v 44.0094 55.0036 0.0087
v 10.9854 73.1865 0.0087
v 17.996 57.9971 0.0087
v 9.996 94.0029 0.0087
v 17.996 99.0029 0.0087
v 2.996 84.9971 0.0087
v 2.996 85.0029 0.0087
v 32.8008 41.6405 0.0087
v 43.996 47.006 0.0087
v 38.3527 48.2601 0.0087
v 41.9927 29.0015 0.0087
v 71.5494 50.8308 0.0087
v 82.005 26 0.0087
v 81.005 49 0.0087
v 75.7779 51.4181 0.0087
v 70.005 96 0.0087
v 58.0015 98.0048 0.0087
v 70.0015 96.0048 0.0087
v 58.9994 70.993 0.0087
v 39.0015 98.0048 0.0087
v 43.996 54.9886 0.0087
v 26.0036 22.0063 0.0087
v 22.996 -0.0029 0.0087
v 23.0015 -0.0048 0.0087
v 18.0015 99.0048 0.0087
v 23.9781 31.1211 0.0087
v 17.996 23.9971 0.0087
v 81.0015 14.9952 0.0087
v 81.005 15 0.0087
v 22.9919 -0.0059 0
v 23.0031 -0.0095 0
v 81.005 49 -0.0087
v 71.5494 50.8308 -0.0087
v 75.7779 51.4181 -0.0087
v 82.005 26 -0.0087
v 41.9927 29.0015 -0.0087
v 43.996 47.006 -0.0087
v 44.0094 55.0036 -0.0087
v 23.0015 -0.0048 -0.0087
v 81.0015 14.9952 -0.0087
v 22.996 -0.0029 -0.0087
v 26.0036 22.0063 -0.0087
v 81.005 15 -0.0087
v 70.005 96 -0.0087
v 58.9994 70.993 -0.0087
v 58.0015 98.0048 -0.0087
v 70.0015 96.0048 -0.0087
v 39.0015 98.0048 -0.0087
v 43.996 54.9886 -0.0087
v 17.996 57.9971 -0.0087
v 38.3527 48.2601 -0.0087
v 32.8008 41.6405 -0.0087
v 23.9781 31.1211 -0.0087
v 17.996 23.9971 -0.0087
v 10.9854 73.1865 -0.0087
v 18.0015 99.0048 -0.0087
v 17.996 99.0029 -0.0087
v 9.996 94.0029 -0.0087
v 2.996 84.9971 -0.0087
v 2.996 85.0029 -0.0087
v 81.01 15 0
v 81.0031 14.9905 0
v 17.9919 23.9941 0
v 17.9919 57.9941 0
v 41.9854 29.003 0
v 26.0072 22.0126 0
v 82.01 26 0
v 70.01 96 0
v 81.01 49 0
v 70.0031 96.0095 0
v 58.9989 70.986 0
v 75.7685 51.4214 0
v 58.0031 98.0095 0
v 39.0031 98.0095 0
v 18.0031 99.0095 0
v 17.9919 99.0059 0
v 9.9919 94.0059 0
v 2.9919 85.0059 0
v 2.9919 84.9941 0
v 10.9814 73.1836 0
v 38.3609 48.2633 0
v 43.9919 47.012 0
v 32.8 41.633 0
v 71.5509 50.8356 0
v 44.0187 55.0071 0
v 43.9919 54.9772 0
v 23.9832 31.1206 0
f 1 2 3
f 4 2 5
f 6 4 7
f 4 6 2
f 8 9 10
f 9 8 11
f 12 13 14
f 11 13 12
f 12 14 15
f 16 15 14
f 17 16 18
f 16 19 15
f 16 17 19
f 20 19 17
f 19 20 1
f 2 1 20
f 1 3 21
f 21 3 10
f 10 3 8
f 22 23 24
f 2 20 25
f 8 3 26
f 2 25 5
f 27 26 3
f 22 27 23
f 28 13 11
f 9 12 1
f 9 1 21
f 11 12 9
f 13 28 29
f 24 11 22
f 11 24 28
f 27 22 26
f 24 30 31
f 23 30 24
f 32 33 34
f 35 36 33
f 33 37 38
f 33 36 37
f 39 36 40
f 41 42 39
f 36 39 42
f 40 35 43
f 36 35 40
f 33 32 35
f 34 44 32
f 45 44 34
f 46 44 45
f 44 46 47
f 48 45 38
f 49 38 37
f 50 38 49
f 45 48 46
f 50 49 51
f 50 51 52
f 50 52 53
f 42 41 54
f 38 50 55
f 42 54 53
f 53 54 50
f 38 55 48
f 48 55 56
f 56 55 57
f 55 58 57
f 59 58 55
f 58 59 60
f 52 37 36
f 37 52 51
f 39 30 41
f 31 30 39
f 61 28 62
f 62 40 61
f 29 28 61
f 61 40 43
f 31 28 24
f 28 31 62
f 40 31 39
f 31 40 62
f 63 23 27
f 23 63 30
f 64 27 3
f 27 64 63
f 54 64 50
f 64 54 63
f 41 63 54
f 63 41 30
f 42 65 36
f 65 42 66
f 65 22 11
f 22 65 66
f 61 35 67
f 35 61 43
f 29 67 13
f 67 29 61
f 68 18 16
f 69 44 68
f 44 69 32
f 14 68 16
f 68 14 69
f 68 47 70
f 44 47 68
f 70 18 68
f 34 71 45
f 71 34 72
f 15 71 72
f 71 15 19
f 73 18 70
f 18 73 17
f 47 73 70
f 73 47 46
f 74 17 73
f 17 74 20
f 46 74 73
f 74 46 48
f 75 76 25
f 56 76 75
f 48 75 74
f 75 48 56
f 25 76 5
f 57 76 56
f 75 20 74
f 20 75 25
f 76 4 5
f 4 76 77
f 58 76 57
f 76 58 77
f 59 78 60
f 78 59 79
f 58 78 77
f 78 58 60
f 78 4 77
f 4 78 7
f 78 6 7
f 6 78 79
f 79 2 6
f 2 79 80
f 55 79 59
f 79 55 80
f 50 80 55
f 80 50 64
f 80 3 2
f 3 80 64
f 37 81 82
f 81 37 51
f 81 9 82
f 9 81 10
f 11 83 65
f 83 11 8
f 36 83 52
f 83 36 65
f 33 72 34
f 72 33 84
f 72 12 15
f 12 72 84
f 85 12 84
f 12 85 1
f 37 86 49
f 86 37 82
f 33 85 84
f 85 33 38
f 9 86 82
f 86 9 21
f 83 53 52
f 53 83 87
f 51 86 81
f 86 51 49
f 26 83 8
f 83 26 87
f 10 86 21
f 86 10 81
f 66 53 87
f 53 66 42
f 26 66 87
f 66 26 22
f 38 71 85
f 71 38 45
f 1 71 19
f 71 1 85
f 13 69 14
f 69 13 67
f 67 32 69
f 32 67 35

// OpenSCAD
color([0.5839405385485582,0.4048698908705002,0.6877557316706271]) hull(){
    translate([23,0]) sphere(0.01);
    translate([64,14]) sphere(0.01);
    translate([68,15]) sphere(0.01);
}
color([0.29310936231965135,0.08456113000314536,0.6409271470126323]) hull(){
    translate([23,0]) sphere(0.01);
    translate([68,15]) sphere(0.01);
    translate([81,15]) sphere(0.01);
}
color([0.38512246522478266,0.6162859510128613,0.407224705538046]) hull(){
    translate([23,0]) sphere(0.01);
    translate([81,15]) sphere(0.01);
    translate([72,20]) sphere(0.01);
}
color([0.6107800780239486,0.9541913078580654,0.09369719926319908]) hull(){
    translate([23,0]) sphere(0.01);
    translate([72,20]) sphere(0.01);
    translate([24,21]) sphere(0.01);
}
color([0.4396226851829427,0.9817497074141792,0.30111933510979894]) hull(){
    translate([23,0]) sphere(0.01);
    translate([24,21]) sphere(0.01);
    translate([18,24]) sphere(0.01);
}
color([0.08571041628526821,0.691130580335744,0.16573157374072334]) hull(){
    translate([18,24]) sphere(0.01);
    translate([24,21]) sphere(0.01);
    translate([26,22]) sphere(0.01);
}
color([0.4668304924867862,0.30100213617539295,0.3511677492745029]) hull(){
    translate([26,22]) sphere(0.01);
    translate([24,21]) sphere(0.01);
    translate([42,29]) sphere(0.01);
}
color([0.05564944269037686,0.7696481469448815,0.686275624239137]) hull(){
    translate([42,29]) sphere(0.01);
    translate([24,21]) sphere(0.01);
    translate([72,20]) sphere(0.01);
}
color([0.15447252119296884,0.35335085758162643,0.18799175914388588]) hull(){
    translate([42,29]) sphere(0.01);
    translate([72,20]) sphere(0.01);
    translate([58,33]) sphere(0.01);
}
color([0.41322879780265653,0.82270842281296,0.9057146612667819]) hull(){
    translate([58,33]) sphere(0.01);
    translate([72,20]) sphere(0.01);
    translate([82,26]) sphere(0.01);
}
color([0.9688547633127277,0.5528378273263655,0.12760284187612392]) hull(){
    translate([82,26]) sphere(0.01);
    translate([72,20]) sphere(0.01);
    translate([81,15]) sphere(0.01);
}
color([0.1710979555253146,0.7131998843266452,0.6397779425125977]) hull(){
    translate([82,26]) sphere(0.01);
    translate([81,15]) sphere(0.01);
    translate([80,52]) sphere(0.01);
}
color([0.57496968906483,0.8489371230716904,0.07944838941339594]) hull(){
    translate([80,52]) sphere(0.01);
    translate([81,15]) sphere(0.01);
    translate([81,49]) sphere(0.01);
}
color([0.040333123224873146,0.9305910632054132,0.3080440975445232]) hull(){
    translate([80,52]) sphere(0.01);
    translate([81,49]) sphere(0.01);
    translate([77,50]) sphere(0.01);
}
color([0.6084655882345898,0.4923441190446234,0.7069385087242315]) hull(){
    translate([77,50]) sphere(0.01);
    translate([81,49]) sphere(0.01);
    translate([70,96]) sphere(0.01);
}
color([0.6803385961846494,0.18024793645131376,0.10787678186317007]) hull(){
    translate([77,50]) sphere(0.01);
    translate([70,96]) sphere(0.01);
    translate([59,71]) sphere(0.01);
}
color([0.1335624130282893,0.47731112778056706,0.8393950916733898]) hull(){
    translate([59,71]) sphere(0.01);
    translate([70,96]) sphere(0.01);
    translate([58,98]) sphere(0.01);
}
color([0.6780893207968227,0.08337096158279222,0.27725115680544954]) hull(){
    translate([59,71]) sphere(0.01);
    translate([58,98]) sphere(0.01);
    translate([50,93]) sphere(0.01);
}
color([0.9965791662073833,0.03375154870506614,0.10494976972159242]) hull(){
    translate([50,93]) sphere(0.01);
    translate([58,98]) sphere(0.01);
    translate([39,98]) sphere(0.01);
}
color([0.516844917539197,0.1360610465034362,0.543805910213663]) hull(){
    translate([39,98]) sphere(0.01);
    translate([58,98]) sphere(0.01);
    translate([70,96]) sphere(0.01);
}
color([0.04901628196141694,0.4867102513994055,0.8813892002857401]) hull(){
    translate([39,98]) sphere(0.01);
    translate([70,96]) sphere(0.01);
    translate([18,99]) sphere(0.01);
}
color([0.3053751014353143,0.40772022041766365,0.31297204198076634]) hull(){
    translate([18,99]) sphere(0.01);
    translate([70,96]) sphere(0.01);
    translate([10,94]) sphere(0.01);
}
color([0.49907796034366436,0.6160709555012981,0.9916538905911245]) hull(){
    translate([10,94]) sphere(0.01);
    translate([70,96]) sphere(0.01);
    translate([22,90]) sphere(0.01);
}
color([0.3123575451593331,0.46364206475662195,0.8862899719975306]) hull(){
    translate([22,90]) sphere(0.01);
    translate([70,96]) sphere(0.01);
    translate([58,98]) sphere(0.01);
}
color([0.5738800220993816,0.8494037217359881,0.24323676398212035]) hull(){
    translate([22,90]) sphere(0.01);
    translate([58,98]) sphere(0.01);
    translate([39,98]) sphere(0.01);
}
color([0.8402878098664139,0.9530478541805099,0.16594803365564914]) hull(){
    translate([22,90]) sphere(0.01);
    translate([39,98]) sphere(0.01);
    translate([20,83]) sphere(0.01);
}
color([0.0023370868964924796,0.7387895340607371,0.5374530602666081]) hull(){
    translate([20,83]) sphere(0.01);
    translate([39,98]) sphere(0.01);
    translate([18,99]) sphere(0.01);
}
color([0.25604025835089217,0.4320068924153808,0.5112453323210508]) hull(){
    translate([20,83]) sphere(0.01);
    translate([18,99]) sphere(0.01);
    translate([6,84]) sphere(0.01);
}
color([0.7462272619347637,0.5039790716190428,0.8850839351693509]) hull(){
    translate([6,84]) sphere(0.01);
    translate([18,99]) sphere(0.01);
    translate([10,94]) sphere(0.01);
}
color([0.6652757233710683,0.22263754843686523,0.08942086350367451]) hull(){
    translate([6,84]) sphere(0.01);
    translate([10,94]) sphere(0.01);
    translate([3,85]) sphere(0.01);
}
color([0.6195232841458308,0.9036720387350747,0.7222923954673625]) hull(){
    translate([6,84]) sphere(0.01);
    translate([3,85]) sphere(0.01);
    translate([16,79]) sphere(0.01);
}
color([0.6665075097113882,0.5421139713900744,0.6943978877819516]) hull(){
    translate([16,79]) sphere(0.01);
    translate([3,85]) sphere(0.01);
    translate([26,51]) sphere(0.01);
}
color([0.9269770591996176,0.12480324665016229,0.8422397758241813]) hull(){
    translate([26,51]) sphere(0.01);
    translate([3,85]) sphere(0.01);
    translate([30,57]) sphere(0.01);
}
color([0.028249143050612435,0.8554899328562455,0.6212809598996976]) hull(){
    translate([30,57]) sphere(0.01);
    translate([3,85]) sphere(0.01);
    translate([20,83]) sphere(0.01);
}
color([0.6435486749275994,0.4857227915978113,0.2898251547629681]) hull(){
    translate([30,57]) sphere(0.01);
    translate([20,83]) sphere(0.01);
    translate([22,90]) sphere(0.01);
}
color([0.21709076393122206,0.4979948584580751,0.6176241526046676]) hull(){
    translate([30,57]) sphere(0.01);
    translate([22,90]) sphere(0.01);
    translate([18,58]) sphere(0.01);
}
color([0.4722249532281336,0.7228331534363125,0.6109414561657331]) hull(){
    translate([18,58]) sphere(0.01);
    translate([22,90]) sphere(0.01);
    translate([18,99]) sphere(0.01);
}
color([0.5330085163671737,0.6769359871291822,0.5973748769978083]) hull(){
    translate([18,58]) sphere(0.01);
    translate([18,99]) sphere(0.01);
    translate([6,84]) sphere(0.01);
}
color([0.14460255854654236,0.21273280877313017,0.8417179364881341]) hull(){
    translate([18,58]) sphere(0.01);
    translate([6,84]) sphere(0.01);
    translate([16,79]) sphere(0.01);
}
color([0.6300391880279899,0.5103677782275869,0.4479627161837708]) hull(){
    translate([18,58]) sphere(0.01);
    translate([16,79]) sphere(0.01);
    translate([26,51]) sphere(0.01);
}
color([0.2903518628620462,0.1744676713524972,0.5457372127765215]) hull(){
    translate([18,58]) sphere(0.01);
    translate([26,51]) sphere(0.01);
    translate([44,55]) sphere(0.01);
}
color([0.6340658375422632,0.7004271366493812,0.690956934786038]) hull(){
    translate([44,55]) sphere(0.01);
    translate([26,51]) sphere(0.01);
    translate([35,48]) sphere(0.01);
}
color([0.013948469234104865,0.8018456354370093,0.2607079205191076]) hull(){
    translate([35,48]) sphere(0.01);
    translate([26,51]) sphere(0.01);
    translate([44,47]) sphere(0.01);
}
color([0.01899716010339858,0.7507132946374245,0.44168653561511173]) hull(){
    translate([44,47]) sphere(0.01);
    translate([26,51]) sphere(0.01);
    translate([42,29]) sphere(0.01);
}
color([0.1668653701245908,0.45955837321901094,0.7876756969907556]) hull(){
    translate([42,29]) sphere(0.01);
    translate([26,51]) sphere(0.01);
    translate([35,48]) sphere(0.01);
}
color([0.09564527702692727,0.06733136152719421,0.7816649665975636]) hull(){
    translate([42,29]) sphere(0.01);
    translate([35,48]) sphere(0.01);
    translate([58,33]) sphere(0.01);
}
color([0.030385075649315252,0.33346286891595733,0.08647112242809318]) hull(){
    translate([58,33]) sphere(0.01);
    translate([35,48]) sphere(0.01);
    translate([44,47]) sphere(0.01);
}
color([0.8161439782233904,0.05657658467482607,0.8243668117903717]) hull(){
    translate([58,33]) sphere(0.01);
    translate([44,47]) sphere(0.01);
    translate([80,52]) sphere(0.01);
}
color([0.05808931884644186,0.6181904095369413,0.1426995958976538]) hull(){
    translate([44,47]) sphere(0.01);
    translate([77,50]) sphere(0.01);
    translate([80,52]) sphere(0.01);
}
color([0.3846464495954227,0.3794414211645075,0.7643773332264734]) hull(){
    translate([44,47]) sphere(0.01);
    translate([44,55]) sphere(0.01);
    translate([77,50]) sphere(0.01);
}
color([0.3116889002403487,0.7690158776827113,0.7674729074453902]) hull(){
    translate([44,55]) sphere(0.01);
    translate([18,58]) sphere(0.01);
    translate([18,24]) sphere(0.01);
}
color([0.3394448706328078,0.45855440081433096,0.0007502935671159783]) hull(){
    translate([18,24]) sphere(0.01);
    translate([18,58]) sphere(0.01);
    translate([26,22]) sphere(0.01);
}
color([0.8084995756647368,0.0331322283588068,0.9954935019736515]) hull(){
    translate([18,58]) sphere(0.01);
    translate([30,57]) sphere(0.01);
    translate([44,55]) sphere(0.01);
}
color([0.32750610520168044,0.511786711221762,0.09639677946248049]) hull(){
    translate([44,55]) sphere(0.01);
    translate([30,57]) sphere(0.01);
    translate([59,71]) sphere(0.01);
}
color([0.46647601470953737,0.043404226035316795,0.8089506697449751]) hull(){
    translate([59,71]) sphere(0.01);
    translate([30,57]) sphere(0.01);
    translate([50,93]) sphere(0.01);
}
color([0.9065579579370614,0.48874197586323487,0.4689182776921319]) hull(){
    translate([50,93]) sphere(0.01);
    translate([30,57]) sphere(0.01);
    translate([20,83]) sphere(0.01);
}
color([0.9999833648369341,0.42392948264922625,0.11056216143511133]) hull(){
    translate([50,93]) sphere(0.01);
    translate([20,83]) sphere(0.01);
    translate([39,98]) sphere(0.01);
}
color([0.5007484231317689,0.23725843071495933,0.7435751616565288]) hull(){
    translate([58,33]) sphere(0.01);
    translate([80,52]) sphere(0.01);
    translate([77,50]) sphere(0.01);
}
color([0.030326511183225713,0.9534383365251057,0.44454391677925087]) hull(){
    translate([58,33]) sphere(0.01);
    translate([77,50]) sphere(0.01);
    translate([82,26]) sphere(0.01);
}
color([0.4017260225039573,0.6984802625757133,0.14751428227125585]) hull(){
    translate([82,26]) sphere(0.01);
    translate([77,50]) sphere(0.01);
    translate([81,49]) sphere(0.01);
}
color([0.592053202978914,0.7602792343344718,0.23214841748979886]) hull(){
    translate([82,26]) sphere(0.01);
    translate([81,49]) sphere(0.01);
    translate([80,52]) sphere(0.01);
}
color([0.2215781656479593,0.24536616409996503,0.7021925659500807]) hull(){
    translate([68,15]) sphere(0.01);
    translate([64,14]) sphere(0.01);
    translate([72,20]) sphere(0.01);
}
color([0.5457605096294114,0.54011508338913,0.5459453680001618]) hull(){
    translate([64,14]) sphere(0.01);
    translate([72,20]) sphere(0.01);
    translate([68,15]) sphere(0.01);
}
